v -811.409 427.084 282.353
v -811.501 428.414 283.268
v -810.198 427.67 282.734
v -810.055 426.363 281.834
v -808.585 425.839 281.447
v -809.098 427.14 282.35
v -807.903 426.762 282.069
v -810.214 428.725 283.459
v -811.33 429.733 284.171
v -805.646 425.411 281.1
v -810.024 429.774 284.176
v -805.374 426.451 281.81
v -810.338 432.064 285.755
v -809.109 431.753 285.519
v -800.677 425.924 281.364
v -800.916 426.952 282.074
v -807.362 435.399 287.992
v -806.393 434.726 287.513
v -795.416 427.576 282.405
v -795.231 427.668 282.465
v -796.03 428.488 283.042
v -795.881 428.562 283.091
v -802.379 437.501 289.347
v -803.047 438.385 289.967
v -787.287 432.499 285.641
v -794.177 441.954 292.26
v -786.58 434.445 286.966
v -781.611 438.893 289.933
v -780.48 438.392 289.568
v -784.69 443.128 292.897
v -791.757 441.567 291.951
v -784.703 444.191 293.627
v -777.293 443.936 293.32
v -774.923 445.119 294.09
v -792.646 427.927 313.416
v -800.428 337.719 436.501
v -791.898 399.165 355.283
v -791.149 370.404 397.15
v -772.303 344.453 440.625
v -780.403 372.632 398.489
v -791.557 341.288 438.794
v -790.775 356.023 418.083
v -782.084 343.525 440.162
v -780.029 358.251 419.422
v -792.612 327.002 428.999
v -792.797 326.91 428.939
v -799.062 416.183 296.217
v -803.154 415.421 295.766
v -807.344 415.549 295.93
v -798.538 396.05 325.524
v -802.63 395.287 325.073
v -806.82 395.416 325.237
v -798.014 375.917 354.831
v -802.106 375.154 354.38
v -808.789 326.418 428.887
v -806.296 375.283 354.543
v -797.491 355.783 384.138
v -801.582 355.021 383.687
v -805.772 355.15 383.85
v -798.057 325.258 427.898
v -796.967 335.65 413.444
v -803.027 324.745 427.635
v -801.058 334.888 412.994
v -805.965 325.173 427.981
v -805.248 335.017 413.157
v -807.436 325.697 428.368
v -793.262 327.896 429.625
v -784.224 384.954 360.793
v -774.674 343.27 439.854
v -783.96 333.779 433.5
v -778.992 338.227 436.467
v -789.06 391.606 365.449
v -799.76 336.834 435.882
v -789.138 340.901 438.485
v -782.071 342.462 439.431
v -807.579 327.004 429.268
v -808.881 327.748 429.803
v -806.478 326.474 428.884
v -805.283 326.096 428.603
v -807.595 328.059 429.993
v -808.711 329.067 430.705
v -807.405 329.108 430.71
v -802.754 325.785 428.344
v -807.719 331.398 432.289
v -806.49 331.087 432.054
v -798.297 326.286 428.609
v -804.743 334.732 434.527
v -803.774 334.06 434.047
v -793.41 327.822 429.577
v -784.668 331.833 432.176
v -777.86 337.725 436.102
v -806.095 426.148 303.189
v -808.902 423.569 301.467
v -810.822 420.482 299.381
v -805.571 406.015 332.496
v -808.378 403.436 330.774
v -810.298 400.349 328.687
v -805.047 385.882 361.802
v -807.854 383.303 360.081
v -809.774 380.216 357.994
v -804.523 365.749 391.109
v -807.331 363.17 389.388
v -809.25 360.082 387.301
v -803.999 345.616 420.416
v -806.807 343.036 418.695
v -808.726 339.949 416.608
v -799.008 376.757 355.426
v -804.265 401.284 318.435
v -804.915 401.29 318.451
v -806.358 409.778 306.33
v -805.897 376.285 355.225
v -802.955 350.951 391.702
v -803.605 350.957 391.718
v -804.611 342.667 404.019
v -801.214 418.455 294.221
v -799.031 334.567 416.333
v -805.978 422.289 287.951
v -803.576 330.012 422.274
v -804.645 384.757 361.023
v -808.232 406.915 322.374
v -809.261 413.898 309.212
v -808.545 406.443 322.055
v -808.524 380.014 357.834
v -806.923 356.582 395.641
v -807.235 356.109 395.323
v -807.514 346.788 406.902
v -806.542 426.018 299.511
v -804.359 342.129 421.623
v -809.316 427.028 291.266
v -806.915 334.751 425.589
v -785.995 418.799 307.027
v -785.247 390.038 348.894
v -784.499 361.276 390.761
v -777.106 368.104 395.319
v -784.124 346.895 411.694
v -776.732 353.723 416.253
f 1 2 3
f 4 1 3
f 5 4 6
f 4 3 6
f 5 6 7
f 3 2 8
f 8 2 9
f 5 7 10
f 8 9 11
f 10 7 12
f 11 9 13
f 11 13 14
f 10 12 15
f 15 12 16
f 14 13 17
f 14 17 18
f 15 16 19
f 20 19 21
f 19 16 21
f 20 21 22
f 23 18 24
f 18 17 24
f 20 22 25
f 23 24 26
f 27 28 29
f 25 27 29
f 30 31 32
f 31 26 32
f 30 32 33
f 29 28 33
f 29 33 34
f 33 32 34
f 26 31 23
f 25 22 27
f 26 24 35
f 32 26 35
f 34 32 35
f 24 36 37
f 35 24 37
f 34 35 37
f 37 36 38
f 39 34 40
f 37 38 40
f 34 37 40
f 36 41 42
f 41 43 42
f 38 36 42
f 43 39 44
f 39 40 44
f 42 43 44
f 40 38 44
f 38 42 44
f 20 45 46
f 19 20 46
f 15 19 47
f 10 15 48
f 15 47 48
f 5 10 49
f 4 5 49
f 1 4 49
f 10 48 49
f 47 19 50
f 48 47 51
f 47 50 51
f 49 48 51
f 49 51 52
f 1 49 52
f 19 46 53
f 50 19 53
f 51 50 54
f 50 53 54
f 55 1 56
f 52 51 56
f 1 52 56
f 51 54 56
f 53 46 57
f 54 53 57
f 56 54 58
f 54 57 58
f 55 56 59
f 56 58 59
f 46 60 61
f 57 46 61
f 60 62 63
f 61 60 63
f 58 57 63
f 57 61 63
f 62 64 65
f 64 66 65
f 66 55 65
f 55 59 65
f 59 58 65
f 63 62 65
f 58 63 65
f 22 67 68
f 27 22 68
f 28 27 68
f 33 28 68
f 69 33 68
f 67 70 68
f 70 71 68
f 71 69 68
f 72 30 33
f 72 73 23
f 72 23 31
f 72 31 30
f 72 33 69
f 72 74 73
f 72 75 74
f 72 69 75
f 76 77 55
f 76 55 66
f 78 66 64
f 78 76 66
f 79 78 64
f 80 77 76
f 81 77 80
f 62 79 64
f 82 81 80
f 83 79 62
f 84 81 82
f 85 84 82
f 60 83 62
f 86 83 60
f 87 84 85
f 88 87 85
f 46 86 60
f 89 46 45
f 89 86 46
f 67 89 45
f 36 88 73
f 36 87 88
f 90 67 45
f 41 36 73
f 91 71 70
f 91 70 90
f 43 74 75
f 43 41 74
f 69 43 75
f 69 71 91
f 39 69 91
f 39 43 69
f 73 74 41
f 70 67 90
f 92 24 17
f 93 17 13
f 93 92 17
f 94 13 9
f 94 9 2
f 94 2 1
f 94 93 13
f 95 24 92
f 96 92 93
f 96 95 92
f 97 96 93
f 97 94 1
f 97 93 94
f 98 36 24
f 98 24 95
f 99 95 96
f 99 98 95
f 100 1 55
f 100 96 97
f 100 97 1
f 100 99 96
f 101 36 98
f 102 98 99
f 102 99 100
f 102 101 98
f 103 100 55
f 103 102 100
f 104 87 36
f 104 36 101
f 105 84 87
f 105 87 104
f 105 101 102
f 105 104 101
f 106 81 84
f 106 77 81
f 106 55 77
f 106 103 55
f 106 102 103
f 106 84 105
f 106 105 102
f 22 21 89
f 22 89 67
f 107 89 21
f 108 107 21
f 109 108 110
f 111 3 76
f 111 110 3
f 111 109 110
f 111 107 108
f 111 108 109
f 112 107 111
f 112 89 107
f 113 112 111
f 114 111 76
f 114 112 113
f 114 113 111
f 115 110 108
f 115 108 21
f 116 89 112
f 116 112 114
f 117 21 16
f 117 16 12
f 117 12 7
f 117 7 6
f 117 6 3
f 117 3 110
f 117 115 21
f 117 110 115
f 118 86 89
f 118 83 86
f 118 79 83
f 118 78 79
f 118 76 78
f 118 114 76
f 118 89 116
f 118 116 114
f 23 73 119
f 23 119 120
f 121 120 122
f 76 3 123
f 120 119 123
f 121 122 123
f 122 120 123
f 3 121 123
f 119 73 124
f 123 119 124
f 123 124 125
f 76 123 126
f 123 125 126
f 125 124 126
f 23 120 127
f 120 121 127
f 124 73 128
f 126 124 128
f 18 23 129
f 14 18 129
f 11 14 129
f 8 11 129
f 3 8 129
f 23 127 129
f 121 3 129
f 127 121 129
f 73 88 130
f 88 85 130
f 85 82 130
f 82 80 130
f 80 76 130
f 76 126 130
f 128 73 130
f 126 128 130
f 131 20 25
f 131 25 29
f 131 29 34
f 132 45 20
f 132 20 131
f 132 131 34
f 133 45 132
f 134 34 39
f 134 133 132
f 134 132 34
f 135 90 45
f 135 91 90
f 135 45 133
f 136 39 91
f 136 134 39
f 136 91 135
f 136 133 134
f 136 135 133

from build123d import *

# Parameters (mm, degrees)
BOSS_EXTRUDE1_DEPTH      = 91.359952
BOSS_EXTRUDE1_DEPTH_BACK = 91.359952
SKETCH1_R                = 6.35
SKETCH2_R                = 5.1943
CUT_EXTRUDE1_DEPTH       = 1020.644650611
EXTRUDE_THIN2_START      = -177.8
EXTRUDE_THIN2_DEPTH      = 177.8


# Read off the part's stored shape, not the designer's step: Extrude-Thin2
with BuildPart() as part:
    # Sketch1 → Boss-Extrude1 (new, two sides: drawn at the far end of the back side and taken through both)
    with BuildSketch(Plane(origin=(-797.858372093, 381.268468163, 361.489360836), x_dir=(0.9998902886126457, 0.009608155882865862, -0.011273600962007019), z_dir=(-0.014732692778449213, 0.5661762234602228, -0.8241525536888277)).offset(-BOSS_EXTRUDE1_DEPTH_BACK)):
        with Locations(Location((0, 0, 0), (0, 0, 90.088001086))):
            Circle(SKETCH1_R)
    extrude(amount=BOSS_EXTRUDE1_DEPTH + BOSS_EXTRUDE1_DEPTH_BACK)

    # Sketch2 → Cut-Extrude1 (cut, through all)
    with BuildSketch(Plane(origin=(-0.310230962, 11.922151452, -17.354440468), x_dir=(0.999890288612646, 0.009608155882749703, -0.011273600962086832), z_dir=(-0.014732692778449222, 0.5661762234602224, -0.8241525536888279))):
        with Locations(Location((-798.182837875, -520.172934132, 0), (0, 0, 270.088001086))):
            Circle(SKETCH2_R)
    extrude(amount=-CUT_EXTRUDE1_DEPTH, mode=Mode.SUBTRACT)


with BuildPart() as body_2:
    # Extrude-Thin2 outline → Extrude-Thin2 (new body)
    with BuildSketch(Plane(origin=(-0.310230962, 11.922151452, -17.354440468), x_dir=(-0.9998914679921496, -0.00834220575504257, 0.012143304313270938), z_dir=(-0.014732692778449226, 0.5661762234602217, -0.8241525536888284)).offset(EXTRUDE_THIN2_START)):
        with BuildLine():
            add(Edge.make_bspline(
                [(795.007403943, 512.444480964), (792.898832326, 513.716162183), (790.876982299, 515.117057901), (787.988681037, 517.417188527), (787.053117975, 518.21438231), (785.23640397, 519.869741584), (784.354204701, 520.729019996), (781.796982108, 523.3901752), (780.214112798, 525.272124548), (778.019643962, 528.241116236), (777.320291883, 529.252086912), (776.31726013, 530.799037937), (775.993088295, 531.321432242), (775.34485148, 532.366291694), (775.020733072, 532.88872142), (774.696614665, 533.411151146)],
                knots=[0, 0, 0, 0, 0.25, 0.25, 0.375, 0.375, 0.5, 0.5, 0.75, 0.75, 0.875, 0.875, 0.9375, 0.9375, 1, 1, 1, 1], degree=3))
            Line((795.007403943, 512.444480964), (795.192139039, 512.334444488))
            add(Edge.make_bspline(
                [(795.192139039, 512.334444488), (795.820659251, 512.014505469), (796.461986169, 511.727191335), (797.766110641, 511.207259179), (798.428497889, 510.973595907), (799.772806417, 510.556032006), (800.452591935, 510.372450513), (801.816227189, 510.07205513), (802.501964688, 509.954924004), (803.88371636, 509.807351912), (804.579705649, 509.776701036), (805.634083311, 509.818402312), (805.989339161, 509.847310141), (806.693578465, 509.938551358), (807.040945003, 510.000493885), (808.067844122, 510.238519077), (808.732238224, 510.466586402), (809.693938159, 510.928501806), (810.007225559, 511.10207874), (810.608415369, 511.482548524), (810.895772864, 511.693557881), (811.186337014, 511.899534791)],
                knots=[0, 0, 0, 0, 0.125, 0.125, 0.25, 0.25, 0.375, 0.375, 0.5, 0.5, 0.625, 0.625, 0.6875, 0.6875, 0.75, 0.75, 0.875, 0.875, 0.9375, 0.9375, 1, 1, 1, 1], degree=3))
            add(Edge.make_bspline(
                [(802.824178055, 525.525933285), (803.415067853, 525.141877964), (803.983569629, 524.729777367), (805.084606371, 523.860520869), (805.61754116, 523.403865824), (806.650104746, 522.448833612), (807.148417232, 521.952115017), (808.08922944, 520.921809356), (808.532960793, 520.386746599), (809.350508798, 519.264437037), (809.724494326, 518.677316278), (810.21478219, 517.743872092), (810.367122157, 517.421936823), (810.63971425, 516.766905357), (810.759520718, 516.435352914), (811.066210954, 515.427787282), (811.200580221, 514.738918347), (811.281121537, 513.675990605), (811.287384359, 513.318194206), (811.258437226, 512.607919011), (811.219408013, 512.253857446), (811.186337014, 511.899534791)],
                knots=[0, 0, 0, 0, 0.125, 0.125, 0.25, 0.25, 0.375, 0.375, 0.5, 0.5, 0.625, 0.625, 0.6875, 0.6875, 0.75, 0.75, 0.875, 0.875, 0.9375, 0.9375, 1, 1, 1, 1], degree=3))
            add(Edge.make_bspline(
                [(802.824178055, 525.525933285), (800.700286301, 526.77528344), (798.504727379, 527.888310329), (795.104625441, 529.334637361), (793.957375, 529.778259938), (791.635103666, 530.588520593), (790.458590691, 530.95555421), (786.898386756, 531.938184836), (784.488036247, 532.434463461), (780.829672903, 532.950837392), (779.606779988, 533.084498644), (777.76751946, 533.229941481), (777.153344334, 533.266248665), (775.9249795, 533.338699906), (775.310797082, 533.374925526), (774.696614665, 533.411151146)],
                knots=[0, 0, 0, 0, 0.25, 0.25, 0.375, 0.375, 0.5, 0.5, 0.75, 0.75, 0.875, 0.875, 0.9375, 0.9375, 1, 1, 1, 1], degree=3))
        make_face()
        with BuildLine():
            Line((795.805834227, 513.447123796), (795.657315978, 513.5355879))
            add(Edge.make_bspline(
                [(795.657315978, 513.5355879), (784.256115309, 520.41167093), (777.067204021, 531.999122223)],
                knots=[0, 0, 0, 1, 1, 1], degree=2))
            add(Edge.make_bspline(
                [(802.155834227, 524.445646424), (790.679875453, 531.196221565), (777.067204021, 531.999122223)],
                knots=[0, 0, 0, 1, 1, 1], degree=2))
            add(Edge.make_bspline(
                [(802.155834227, 524.445646424), (803.357131939, 523.664849768), (807.630718362, 520.192997769), (810.29114838, 515.974403166), (809.976037151, 512.598301742)],
                knots=[0, 0, 0, 0, 0.294150136, 1, 1, 1, 1], degree=3))
            add(Edge.make_bspline(
                [(795.805834227, 513.447123796), (797.082672823, 512.797167788), (802.226178064, 510.832059381), (807.209803167, 510.637356701), (809.976037151, 512.598301742)],
                knots=[0, 0, 0, 0, 0.294150136, 1, 1, 1, 1], degree=3))
        make_face(mode=Mode.SUBTRACT)
    extrude(amount=EXTRUDE_THIN2_DEPTH)


solid = body_2.part
